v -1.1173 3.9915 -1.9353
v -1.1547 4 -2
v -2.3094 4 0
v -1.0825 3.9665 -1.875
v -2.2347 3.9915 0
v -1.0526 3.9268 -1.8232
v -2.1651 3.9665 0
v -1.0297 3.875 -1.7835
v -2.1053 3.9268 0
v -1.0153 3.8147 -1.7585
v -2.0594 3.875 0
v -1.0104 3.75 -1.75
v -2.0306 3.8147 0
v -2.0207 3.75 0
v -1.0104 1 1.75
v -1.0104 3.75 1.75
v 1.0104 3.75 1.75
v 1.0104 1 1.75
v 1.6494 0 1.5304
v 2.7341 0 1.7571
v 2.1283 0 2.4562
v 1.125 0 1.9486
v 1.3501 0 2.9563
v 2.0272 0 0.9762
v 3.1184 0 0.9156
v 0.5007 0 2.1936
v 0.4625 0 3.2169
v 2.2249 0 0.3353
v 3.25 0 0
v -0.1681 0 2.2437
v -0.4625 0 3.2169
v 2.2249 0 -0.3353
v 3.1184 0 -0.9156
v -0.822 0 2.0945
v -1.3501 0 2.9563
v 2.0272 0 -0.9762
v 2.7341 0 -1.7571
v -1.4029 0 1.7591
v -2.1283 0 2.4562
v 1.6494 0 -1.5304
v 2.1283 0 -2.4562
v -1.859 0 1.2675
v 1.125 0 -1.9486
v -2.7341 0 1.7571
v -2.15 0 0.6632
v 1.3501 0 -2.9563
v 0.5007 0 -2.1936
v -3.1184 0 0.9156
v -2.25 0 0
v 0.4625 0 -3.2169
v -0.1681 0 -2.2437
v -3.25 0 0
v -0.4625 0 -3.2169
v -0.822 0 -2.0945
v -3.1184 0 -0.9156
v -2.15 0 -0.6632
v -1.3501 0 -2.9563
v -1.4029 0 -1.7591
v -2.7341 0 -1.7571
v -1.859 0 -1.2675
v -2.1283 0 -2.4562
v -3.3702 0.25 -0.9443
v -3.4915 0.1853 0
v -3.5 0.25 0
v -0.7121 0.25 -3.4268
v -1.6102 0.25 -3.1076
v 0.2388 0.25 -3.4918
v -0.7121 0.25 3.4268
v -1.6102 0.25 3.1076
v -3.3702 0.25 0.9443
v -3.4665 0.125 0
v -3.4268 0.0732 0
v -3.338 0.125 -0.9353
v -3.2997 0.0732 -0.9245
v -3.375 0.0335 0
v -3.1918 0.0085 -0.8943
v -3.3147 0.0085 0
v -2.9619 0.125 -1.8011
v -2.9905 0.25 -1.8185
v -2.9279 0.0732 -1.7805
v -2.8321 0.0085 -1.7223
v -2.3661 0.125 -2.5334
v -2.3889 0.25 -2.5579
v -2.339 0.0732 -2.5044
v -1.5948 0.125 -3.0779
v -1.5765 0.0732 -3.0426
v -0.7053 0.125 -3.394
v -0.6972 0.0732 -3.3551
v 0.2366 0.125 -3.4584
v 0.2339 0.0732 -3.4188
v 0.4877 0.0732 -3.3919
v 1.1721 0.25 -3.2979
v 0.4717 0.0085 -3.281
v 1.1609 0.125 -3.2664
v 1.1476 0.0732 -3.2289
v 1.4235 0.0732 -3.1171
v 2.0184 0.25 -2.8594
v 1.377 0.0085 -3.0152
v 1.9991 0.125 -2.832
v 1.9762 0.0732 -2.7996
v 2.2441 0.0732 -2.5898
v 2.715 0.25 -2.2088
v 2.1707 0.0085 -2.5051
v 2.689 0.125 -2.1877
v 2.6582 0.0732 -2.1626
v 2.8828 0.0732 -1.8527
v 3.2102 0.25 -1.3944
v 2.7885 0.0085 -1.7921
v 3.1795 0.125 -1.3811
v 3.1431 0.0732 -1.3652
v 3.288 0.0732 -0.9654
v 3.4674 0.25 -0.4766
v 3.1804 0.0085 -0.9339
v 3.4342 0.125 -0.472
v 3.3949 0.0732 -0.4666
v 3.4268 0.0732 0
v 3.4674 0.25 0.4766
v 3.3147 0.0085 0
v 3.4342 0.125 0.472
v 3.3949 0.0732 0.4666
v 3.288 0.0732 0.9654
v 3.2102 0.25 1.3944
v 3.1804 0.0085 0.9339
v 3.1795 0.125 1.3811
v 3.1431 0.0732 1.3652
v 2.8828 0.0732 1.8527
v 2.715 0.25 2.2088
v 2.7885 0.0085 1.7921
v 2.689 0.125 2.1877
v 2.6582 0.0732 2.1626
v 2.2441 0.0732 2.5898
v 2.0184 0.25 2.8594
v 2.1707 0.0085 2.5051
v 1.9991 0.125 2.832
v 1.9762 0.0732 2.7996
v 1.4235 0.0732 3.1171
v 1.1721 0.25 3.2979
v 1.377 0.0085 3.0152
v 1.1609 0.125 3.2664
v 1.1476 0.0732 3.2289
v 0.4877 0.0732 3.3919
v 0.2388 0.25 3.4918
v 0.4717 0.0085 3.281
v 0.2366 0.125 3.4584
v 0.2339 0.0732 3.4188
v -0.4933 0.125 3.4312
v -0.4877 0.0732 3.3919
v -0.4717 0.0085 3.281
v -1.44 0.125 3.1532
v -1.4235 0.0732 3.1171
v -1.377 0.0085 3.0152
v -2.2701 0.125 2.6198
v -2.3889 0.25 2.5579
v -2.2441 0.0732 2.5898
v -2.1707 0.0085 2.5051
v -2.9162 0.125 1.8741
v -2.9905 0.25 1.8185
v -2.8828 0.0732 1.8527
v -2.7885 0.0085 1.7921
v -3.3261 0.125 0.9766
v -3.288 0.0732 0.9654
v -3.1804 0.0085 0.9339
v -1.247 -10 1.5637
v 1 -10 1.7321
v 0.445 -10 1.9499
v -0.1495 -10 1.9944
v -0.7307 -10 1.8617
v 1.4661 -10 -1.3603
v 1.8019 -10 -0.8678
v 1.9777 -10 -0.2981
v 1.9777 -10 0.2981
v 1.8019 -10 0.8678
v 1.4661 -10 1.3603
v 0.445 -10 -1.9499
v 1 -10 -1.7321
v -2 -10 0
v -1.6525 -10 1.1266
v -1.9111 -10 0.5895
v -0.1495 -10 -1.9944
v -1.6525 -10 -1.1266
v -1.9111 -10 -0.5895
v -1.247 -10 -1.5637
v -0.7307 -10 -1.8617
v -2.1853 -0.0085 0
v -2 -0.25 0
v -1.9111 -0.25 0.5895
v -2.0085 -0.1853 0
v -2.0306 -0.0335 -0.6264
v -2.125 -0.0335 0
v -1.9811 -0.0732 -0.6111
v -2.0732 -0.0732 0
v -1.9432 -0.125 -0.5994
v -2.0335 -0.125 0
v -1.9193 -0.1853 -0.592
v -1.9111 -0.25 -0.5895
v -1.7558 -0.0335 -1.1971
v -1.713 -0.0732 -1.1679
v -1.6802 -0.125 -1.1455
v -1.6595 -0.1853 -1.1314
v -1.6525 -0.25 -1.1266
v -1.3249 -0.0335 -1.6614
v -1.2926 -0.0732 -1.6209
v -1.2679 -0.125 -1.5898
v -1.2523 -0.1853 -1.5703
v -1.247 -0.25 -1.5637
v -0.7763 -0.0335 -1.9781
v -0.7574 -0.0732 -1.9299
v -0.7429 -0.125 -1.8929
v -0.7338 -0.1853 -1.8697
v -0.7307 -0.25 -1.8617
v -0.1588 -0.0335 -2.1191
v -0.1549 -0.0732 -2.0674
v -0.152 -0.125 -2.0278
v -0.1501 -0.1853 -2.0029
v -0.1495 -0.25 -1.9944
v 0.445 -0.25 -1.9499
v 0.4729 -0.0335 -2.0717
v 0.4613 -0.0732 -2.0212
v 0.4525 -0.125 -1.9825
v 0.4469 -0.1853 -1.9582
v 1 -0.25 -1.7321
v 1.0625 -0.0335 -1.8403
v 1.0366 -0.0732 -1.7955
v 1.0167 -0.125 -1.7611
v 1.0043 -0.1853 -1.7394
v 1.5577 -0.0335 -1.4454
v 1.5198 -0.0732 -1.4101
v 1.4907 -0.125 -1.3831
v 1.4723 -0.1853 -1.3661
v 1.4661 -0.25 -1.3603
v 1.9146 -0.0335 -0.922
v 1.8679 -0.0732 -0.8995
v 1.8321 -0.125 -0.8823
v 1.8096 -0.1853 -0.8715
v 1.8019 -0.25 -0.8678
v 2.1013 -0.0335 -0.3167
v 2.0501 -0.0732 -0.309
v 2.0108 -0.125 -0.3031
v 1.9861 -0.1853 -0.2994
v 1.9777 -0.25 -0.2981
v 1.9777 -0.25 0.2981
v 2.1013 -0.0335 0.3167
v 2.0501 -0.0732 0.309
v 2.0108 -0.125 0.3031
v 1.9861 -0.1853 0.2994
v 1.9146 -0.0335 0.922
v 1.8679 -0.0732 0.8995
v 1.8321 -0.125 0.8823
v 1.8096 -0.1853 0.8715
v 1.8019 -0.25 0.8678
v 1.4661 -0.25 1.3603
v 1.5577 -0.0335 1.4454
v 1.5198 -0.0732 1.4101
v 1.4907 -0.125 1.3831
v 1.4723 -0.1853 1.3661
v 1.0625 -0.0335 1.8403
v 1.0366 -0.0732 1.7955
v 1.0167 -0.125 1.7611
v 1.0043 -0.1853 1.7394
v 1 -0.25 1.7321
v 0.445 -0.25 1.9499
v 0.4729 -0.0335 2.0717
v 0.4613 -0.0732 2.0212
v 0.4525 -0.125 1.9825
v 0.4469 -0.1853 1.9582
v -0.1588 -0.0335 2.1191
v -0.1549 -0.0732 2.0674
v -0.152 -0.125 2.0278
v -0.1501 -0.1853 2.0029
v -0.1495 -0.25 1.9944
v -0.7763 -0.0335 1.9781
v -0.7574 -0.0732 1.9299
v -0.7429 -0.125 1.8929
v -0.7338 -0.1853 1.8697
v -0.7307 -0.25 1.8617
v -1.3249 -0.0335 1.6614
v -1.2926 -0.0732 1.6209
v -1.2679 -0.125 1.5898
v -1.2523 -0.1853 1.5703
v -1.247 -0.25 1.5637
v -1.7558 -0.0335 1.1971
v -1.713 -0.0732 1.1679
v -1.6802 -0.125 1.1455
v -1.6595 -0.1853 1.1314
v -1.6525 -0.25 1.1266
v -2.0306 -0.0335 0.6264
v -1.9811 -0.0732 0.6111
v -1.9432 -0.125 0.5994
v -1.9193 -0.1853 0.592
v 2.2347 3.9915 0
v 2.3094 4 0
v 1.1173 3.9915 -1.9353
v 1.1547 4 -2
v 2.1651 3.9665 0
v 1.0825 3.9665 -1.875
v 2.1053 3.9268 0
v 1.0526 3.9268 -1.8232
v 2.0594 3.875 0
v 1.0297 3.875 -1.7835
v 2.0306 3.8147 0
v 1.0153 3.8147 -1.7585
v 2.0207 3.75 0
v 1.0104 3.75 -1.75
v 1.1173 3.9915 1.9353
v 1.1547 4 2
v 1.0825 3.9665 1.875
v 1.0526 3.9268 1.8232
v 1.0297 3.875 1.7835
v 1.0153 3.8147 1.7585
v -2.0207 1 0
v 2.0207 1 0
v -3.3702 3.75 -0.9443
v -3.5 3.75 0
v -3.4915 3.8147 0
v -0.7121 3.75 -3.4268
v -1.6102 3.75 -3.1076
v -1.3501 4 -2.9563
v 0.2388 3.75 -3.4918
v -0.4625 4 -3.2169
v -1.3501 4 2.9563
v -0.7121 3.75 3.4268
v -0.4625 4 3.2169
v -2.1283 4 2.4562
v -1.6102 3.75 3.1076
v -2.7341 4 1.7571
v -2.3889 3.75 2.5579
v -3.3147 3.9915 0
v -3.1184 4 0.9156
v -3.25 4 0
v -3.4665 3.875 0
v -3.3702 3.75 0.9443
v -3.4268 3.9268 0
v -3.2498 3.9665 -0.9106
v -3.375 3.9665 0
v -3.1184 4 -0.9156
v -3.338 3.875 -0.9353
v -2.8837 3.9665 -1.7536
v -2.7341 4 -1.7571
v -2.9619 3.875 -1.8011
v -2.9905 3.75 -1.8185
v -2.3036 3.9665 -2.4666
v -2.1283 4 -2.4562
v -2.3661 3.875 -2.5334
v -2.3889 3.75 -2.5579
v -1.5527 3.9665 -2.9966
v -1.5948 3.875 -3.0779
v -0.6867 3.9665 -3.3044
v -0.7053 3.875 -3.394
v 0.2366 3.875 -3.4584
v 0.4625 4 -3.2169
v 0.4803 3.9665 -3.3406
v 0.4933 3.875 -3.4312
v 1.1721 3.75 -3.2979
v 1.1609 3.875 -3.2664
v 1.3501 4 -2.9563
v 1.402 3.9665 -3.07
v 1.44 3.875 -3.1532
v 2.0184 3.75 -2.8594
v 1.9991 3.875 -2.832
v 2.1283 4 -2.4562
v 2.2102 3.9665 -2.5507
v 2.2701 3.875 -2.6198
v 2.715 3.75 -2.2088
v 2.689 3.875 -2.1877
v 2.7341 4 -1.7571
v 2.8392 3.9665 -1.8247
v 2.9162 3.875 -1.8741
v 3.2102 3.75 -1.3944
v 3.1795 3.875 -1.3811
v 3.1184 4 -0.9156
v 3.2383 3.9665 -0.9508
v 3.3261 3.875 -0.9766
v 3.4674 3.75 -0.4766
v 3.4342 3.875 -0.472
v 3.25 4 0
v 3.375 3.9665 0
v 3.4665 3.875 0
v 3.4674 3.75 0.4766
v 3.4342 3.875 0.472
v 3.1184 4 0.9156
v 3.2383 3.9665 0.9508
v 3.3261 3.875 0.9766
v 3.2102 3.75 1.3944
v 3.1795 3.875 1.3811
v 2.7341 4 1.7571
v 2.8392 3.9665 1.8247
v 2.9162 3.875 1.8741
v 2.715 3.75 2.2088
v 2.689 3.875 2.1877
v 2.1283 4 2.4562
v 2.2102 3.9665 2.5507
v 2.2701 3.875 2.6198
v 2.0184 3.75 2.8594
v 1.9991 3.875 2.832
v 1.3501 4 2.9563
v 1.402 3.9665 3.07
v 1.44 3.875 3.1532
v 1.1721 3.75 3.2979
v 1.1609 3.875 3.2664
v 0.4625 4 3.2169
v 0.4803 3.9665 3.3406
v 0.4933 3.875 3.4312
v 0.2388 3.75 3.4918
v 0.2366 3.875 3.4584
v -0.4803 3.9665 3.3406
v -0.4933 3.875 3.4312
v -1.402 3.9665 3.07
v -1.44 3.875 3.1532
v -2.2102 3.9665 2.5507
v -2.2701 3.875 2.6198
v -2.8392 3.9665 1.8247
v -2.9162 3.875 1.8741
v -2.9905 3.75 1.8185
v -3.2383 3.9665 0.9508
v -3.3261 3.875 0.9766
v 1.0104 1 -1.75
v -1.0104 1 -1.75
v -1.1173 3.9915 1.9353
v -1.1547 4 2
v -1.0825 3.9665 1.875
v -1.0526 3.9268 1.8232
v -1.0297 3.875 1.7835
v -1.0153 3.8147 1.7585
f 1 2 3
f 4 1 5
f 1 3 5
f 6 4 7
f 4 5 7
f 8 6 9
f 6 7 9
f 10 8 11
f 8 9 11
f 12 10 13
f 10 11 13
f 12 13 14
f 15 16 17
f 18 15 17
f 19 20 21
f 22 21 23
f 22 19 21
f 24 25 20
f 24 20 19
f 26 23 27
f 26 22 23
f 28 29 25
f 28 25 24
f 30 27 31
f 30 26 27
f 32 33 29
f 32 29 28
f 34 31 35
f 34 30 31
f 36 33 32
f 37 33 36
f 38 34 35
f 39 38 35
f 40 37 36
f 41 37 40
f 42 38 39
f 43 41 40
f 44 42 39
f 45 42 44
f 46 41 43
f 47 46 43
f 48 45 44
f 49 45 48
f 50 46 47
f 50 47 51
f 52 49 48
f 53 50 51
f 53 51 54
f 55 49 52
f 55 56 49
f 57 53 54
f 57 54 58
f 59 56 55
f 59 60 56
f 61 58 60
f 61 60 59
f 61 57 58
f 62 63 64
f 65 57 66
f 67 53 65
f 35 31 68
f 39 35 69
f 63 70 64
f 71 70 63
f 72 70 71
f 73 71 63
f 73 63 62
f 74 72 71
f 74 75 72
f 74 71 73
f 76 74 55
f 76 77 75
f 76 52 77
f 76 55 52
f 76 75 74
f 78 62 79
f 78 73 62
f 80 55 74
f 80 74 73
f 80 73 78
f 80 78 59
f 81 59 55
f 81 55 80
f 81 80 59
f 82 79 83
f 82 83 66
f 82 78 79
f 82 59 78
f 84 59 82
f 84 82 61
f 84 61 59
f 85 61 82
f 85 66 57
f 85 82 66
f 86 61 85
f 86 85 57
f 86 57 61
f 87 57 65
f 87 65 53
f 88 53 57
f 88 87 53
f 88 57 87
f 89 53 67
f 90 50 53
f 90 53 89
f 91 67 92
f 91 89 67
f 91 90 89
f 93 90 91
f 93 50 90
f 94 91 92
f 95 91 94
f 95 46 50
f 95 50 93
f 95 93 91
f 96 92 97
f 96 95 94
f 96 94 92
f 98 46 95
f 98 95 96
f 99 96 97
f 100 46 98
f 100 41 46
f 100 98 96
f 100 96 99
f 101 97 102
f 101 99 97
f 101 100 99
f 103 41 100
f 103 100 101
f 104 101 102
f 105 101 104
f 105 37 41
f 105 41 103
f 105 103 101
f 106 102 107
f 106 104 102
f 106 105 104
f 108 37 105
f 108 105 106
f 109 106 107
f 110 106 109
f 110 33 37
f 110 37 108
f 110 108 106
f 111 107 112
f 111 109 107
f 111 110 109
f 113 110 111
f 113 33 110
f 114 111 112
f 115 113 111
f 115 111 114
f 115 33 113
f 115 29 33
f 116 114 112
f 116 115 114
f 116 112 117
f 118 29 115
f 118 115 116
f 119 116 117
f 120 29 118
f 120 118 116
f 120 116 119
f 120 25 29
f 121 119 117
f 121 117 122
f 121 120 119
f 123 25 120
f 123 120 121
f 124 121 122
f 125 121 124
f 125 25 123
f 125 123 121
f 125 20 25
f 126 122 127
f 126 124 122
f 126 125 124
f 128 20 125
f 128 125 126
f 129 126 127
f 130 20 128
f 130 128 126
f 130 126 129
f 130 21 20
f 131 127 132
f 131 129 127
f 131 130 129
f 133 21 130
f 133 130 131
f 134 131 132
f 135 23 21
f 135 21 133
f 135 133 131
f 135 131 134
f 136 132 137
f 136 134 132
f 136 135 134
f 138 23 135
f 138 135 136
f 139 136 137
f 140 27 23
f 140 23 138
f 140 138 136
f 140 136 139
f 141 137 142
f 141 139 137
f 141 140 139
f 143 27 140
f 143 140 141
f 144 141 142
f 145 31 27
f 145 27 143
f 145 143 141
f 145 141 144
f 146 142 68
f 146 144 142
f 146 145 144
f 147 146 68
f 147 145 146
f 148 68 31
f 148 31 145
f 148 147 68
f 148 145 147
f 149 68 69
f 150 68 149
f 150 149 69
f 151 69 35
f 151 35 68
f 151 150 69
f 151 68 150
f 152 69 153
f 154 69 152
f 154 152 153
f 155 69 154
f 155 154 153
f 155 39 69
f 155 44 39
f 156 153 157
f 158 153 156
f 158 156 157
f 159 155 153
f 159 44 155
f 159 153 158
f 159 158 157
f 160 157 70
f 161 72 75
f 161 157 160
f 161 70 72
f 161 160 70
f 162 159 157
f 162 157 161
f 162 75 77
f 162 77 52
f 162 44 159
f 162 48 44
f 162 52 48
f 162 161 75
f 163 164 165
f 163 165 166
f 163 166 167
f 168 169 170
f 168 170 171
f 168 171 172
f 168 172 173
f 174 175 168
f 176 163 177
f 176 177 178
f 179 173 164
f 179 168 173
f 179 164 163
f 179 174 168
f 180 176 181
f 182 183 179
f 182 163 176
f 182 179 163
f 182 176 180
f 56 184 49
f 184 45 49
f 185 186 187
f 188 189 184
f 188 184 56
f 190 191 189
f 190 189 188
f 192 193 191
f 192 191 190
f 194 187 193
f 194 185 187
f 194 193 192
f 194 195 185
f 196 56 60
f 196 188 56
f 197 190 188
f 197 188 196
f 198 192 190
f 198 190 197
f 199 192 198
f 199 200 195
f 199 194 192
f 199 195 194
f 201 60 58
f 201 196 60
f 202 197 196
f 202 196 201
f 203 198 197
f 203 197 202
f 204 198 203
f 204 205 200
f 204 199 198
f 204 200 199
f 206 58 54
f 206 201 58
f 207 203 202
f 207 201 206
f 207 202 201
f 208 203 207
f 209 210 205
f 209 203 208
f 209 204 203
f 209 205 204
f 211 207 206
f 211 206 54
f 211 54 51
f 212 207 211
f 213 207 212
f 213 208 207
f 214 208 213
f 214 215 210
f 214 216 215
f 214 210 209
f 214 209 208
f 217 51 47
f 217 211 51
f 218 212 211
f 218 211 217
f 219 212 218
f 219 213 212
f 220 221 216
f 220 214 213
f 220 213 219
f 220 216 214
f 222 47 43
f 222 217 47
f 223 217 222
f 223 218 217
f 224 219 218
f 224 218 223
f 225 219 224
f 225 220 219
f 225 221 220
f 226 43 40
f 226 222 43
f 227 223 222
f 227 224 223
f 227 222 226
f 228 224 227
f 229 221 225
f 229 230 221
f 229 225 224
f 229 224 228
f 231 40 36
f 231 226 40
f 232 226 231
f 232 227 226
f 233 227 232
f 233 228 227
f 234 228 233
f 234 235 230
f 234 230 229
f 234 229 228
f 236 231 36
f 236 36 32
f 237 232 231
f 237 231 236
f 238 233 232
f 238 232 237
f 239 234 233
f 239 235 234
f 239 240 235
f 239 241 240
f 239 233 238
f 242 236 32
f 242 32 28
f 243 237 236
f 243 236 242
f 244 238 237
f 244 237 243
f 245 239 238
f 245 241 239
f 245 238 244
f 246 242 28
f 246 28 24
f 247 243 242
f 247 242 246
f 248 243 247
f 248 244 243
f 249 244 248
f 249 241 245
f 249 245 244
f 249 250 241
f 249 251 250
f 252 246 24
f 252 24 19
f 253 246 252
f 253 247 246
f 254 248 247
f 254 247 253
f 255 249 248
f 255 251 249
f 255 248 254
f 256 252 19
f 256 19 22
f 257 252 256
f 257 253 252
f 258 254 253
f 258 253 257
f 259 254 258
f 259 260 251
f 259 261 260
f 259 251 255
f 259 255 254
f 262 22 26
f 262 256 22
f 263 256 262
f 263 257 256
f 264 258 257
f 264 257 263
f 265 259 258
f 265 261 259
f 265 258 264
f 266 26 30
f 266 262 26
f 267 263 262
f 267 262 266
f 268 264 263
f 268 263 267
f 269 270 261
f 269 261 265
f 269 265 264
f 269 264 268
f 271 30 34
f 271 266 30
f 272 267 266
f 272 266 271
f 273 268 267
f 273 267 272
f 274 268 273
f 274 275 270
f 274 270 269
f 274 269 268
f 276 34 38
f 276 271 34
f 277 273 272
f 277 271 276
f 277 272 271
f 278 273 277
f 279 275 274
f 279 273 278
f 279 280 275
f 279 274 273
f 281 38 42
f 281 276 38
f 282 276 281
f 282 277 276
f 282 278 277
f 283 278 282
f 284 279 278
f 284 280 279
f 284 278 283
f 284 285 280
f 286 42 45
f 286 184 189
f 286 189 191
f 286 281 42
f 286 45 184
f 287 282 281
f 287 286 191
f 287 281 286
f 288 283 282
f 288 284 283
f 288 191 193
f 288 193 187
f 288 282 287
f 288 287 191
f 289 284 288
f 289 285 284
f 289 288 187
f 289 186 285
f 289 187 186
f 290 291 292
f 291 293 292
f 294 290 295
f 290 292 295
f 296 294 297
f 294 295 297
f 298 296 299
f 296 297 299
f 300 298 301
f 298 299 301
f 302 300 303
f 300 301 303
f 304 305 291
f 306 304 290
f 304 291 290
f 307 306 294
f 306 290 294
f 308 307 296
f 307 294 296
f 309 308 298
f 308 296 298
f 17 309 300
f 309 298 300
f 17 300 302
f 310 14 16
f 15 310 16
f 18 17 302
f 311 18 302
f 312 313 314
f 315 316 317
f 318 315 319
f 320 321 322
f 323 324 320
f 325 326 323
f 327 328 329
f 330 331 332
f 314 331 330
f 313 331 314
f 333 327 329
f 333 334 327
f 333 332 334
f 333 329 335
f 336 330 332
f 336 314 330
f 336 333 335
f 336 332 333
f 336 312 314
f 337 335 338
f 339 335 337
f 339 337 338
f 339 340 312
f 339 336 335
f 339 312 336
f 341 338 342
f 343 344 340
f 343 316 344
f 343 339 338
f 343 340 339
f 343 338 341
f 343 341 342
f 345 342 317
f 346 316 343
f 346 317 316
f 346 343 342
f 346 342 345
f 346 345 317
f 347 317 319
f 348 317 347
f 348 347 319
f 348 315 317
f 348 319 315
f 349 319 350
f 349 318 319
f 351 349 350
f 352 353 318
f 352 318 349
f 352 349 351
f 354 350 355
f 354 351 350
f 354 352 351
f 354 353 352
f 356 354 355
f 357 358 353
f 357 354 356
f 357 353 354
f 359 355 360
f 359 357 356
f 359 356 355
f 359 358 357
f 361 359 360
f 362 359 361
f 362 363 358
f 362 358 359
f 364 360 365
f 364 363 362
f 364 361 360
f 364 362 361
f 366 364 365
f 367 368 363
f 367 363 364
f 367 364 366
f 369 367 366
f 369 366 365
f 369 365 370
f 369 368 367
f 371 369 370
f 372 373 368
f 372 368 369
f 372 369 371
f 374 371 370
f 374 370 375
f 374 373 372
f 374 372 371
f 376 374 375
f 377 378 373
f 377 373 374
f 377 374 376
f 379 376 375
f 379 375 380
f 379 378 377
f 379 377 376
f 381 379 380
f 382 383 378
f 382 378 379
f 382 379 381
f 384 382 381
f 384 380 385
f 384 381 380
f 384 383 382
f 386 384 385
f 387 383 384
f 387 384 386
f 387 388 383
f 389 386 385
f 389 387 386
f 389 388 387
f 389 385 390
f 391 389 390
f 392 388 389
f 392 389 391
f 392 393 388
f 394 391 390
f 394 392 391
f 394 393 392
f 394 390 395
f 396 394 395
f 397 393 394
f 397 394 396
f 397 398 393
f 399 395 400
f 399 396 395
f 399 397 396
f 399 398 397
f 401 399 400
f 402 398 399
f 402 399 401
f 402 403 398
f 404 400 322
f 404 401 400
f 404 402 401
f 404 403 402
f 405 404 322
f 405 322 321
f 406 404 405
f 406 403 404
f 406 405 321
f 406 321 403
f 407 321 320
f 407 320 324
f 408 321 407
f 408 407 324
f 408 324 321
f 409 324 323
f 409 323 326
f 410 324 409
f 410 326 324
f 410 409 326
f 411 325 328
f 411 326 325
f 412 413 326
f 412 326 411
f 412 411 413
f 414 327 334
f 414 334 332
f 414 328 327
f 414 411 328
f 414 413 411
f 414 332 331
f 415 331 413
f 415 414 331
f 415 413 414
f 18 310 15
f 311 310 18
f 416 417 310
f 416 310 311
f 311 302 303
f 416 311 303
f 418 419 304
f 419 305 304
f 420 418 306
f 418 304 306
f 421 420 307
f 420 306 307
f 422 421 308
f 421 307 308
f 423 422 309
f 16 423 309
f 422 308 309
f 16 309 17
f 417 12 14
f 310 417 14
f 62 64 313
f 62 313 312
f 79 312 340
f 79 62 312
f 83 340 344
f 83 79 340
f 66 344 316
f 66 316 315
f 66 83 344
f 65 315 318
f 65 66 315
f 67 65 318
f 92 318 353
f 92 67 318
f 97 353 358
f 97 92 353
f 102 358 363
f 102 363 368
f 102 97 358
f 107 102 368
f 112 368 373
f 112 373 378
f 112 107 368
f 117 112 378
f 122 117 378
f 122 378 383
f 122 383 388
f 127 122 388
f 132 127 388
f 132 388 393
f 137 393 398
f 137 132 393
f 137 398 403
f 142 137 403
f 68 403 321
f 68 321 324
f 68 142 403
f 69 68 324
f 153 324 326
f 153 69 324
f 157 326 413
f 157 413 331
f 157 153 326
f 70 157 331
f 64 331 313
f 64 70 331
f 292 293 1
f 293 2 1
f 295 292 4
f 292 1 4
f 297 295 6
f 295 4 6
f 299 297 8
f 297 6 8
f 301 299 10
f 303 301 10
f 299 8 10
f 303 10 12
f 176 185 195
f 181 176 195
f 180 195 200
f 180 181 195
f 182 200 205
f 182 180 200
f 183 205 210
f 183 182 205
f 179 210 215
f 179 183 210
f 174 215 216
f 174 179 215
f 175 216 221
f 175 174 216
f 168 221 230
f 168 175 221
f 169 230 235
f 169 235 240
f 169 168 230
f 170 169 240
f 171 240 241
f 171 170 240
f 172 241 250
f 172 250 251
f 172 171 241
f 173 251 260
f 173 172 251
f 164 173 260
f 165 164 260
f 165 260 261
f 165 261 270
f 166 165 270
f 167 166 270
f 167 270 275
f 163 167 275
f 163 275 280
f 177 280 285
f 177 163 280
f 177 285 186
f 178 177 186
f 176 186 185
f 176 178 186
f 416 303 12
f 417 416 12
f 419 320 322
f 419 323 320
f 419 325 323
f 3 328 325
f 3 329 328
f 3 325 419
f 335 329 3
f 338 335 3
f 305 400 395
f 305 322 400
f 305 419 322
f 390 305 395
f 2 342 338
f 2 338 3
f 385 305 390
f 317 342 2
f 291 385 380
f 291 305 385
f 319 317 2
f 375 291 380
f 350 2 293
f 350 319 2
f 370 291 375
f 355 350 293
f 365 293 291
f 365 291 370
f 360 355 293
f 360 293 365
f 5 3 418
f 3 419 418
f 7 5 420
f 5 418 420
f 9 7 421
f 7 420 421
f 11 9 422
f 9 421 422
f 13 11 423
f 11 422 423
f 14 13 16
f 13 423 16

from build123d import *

# Parameters (mm, degrees)
CUT_EXTRUDE1_DEPTH = 3
FILLET1_R          = 0.25


with BuildPart() as part:
    # Sketch2 → Revolve1 (revolve)
    with BuildSketch(Plane.XY, mode=Mode.PRIVATE) as revolve1_sk:
        Polygon((0, 4), (3.5, 4), (3.5, 0), (2, 0), (2, -10), (0, -10), align=None)
    revolve(revolve1_sk.sketch.rotate(Axis((0, 21.322324325, 0), (0, -1, 0)), 180), axis=Axis((0, 21.322324325, 0), (0, -1, 0)))

    # Sketch3 → Cut-Extrude1 (cut)
    with BuildSketch(Plane(origin=(0, 4, 0), x_dir=(1, 0, 0), z_dir=(0, 1, 0))):
        Polygon((2.020725942, 0), (1.010362971, 1.75), (-1.010362971, 1.75), (-2.020725942, 0), (-1.010362971, -1.75), (1.010362971, -1.75), align=None)
    extrude(amount=-CUT_EXTRUDE1_DEPTH, mode=Mode.SUBTRACT)

    # Fillet1
    fillet1_edges = [part.edges().sort_by_distance(p)[0] for p in [
        (1.515544457, 4, 0.875),
        (1.515544457, 4, -0.875),
        (0, 4, -1.75),
        (-1.515544457, 4, -0.875),
        (-1.515544457, 4, 0.875),
        (0, 4, 1.75),
        (2, 0, 0),
        (3.5, 0, 0),
        (3.5, 4, 0),
    ]]
    fillet(fillet1_edges, radius=FILLET1_R)


solid = part.part
